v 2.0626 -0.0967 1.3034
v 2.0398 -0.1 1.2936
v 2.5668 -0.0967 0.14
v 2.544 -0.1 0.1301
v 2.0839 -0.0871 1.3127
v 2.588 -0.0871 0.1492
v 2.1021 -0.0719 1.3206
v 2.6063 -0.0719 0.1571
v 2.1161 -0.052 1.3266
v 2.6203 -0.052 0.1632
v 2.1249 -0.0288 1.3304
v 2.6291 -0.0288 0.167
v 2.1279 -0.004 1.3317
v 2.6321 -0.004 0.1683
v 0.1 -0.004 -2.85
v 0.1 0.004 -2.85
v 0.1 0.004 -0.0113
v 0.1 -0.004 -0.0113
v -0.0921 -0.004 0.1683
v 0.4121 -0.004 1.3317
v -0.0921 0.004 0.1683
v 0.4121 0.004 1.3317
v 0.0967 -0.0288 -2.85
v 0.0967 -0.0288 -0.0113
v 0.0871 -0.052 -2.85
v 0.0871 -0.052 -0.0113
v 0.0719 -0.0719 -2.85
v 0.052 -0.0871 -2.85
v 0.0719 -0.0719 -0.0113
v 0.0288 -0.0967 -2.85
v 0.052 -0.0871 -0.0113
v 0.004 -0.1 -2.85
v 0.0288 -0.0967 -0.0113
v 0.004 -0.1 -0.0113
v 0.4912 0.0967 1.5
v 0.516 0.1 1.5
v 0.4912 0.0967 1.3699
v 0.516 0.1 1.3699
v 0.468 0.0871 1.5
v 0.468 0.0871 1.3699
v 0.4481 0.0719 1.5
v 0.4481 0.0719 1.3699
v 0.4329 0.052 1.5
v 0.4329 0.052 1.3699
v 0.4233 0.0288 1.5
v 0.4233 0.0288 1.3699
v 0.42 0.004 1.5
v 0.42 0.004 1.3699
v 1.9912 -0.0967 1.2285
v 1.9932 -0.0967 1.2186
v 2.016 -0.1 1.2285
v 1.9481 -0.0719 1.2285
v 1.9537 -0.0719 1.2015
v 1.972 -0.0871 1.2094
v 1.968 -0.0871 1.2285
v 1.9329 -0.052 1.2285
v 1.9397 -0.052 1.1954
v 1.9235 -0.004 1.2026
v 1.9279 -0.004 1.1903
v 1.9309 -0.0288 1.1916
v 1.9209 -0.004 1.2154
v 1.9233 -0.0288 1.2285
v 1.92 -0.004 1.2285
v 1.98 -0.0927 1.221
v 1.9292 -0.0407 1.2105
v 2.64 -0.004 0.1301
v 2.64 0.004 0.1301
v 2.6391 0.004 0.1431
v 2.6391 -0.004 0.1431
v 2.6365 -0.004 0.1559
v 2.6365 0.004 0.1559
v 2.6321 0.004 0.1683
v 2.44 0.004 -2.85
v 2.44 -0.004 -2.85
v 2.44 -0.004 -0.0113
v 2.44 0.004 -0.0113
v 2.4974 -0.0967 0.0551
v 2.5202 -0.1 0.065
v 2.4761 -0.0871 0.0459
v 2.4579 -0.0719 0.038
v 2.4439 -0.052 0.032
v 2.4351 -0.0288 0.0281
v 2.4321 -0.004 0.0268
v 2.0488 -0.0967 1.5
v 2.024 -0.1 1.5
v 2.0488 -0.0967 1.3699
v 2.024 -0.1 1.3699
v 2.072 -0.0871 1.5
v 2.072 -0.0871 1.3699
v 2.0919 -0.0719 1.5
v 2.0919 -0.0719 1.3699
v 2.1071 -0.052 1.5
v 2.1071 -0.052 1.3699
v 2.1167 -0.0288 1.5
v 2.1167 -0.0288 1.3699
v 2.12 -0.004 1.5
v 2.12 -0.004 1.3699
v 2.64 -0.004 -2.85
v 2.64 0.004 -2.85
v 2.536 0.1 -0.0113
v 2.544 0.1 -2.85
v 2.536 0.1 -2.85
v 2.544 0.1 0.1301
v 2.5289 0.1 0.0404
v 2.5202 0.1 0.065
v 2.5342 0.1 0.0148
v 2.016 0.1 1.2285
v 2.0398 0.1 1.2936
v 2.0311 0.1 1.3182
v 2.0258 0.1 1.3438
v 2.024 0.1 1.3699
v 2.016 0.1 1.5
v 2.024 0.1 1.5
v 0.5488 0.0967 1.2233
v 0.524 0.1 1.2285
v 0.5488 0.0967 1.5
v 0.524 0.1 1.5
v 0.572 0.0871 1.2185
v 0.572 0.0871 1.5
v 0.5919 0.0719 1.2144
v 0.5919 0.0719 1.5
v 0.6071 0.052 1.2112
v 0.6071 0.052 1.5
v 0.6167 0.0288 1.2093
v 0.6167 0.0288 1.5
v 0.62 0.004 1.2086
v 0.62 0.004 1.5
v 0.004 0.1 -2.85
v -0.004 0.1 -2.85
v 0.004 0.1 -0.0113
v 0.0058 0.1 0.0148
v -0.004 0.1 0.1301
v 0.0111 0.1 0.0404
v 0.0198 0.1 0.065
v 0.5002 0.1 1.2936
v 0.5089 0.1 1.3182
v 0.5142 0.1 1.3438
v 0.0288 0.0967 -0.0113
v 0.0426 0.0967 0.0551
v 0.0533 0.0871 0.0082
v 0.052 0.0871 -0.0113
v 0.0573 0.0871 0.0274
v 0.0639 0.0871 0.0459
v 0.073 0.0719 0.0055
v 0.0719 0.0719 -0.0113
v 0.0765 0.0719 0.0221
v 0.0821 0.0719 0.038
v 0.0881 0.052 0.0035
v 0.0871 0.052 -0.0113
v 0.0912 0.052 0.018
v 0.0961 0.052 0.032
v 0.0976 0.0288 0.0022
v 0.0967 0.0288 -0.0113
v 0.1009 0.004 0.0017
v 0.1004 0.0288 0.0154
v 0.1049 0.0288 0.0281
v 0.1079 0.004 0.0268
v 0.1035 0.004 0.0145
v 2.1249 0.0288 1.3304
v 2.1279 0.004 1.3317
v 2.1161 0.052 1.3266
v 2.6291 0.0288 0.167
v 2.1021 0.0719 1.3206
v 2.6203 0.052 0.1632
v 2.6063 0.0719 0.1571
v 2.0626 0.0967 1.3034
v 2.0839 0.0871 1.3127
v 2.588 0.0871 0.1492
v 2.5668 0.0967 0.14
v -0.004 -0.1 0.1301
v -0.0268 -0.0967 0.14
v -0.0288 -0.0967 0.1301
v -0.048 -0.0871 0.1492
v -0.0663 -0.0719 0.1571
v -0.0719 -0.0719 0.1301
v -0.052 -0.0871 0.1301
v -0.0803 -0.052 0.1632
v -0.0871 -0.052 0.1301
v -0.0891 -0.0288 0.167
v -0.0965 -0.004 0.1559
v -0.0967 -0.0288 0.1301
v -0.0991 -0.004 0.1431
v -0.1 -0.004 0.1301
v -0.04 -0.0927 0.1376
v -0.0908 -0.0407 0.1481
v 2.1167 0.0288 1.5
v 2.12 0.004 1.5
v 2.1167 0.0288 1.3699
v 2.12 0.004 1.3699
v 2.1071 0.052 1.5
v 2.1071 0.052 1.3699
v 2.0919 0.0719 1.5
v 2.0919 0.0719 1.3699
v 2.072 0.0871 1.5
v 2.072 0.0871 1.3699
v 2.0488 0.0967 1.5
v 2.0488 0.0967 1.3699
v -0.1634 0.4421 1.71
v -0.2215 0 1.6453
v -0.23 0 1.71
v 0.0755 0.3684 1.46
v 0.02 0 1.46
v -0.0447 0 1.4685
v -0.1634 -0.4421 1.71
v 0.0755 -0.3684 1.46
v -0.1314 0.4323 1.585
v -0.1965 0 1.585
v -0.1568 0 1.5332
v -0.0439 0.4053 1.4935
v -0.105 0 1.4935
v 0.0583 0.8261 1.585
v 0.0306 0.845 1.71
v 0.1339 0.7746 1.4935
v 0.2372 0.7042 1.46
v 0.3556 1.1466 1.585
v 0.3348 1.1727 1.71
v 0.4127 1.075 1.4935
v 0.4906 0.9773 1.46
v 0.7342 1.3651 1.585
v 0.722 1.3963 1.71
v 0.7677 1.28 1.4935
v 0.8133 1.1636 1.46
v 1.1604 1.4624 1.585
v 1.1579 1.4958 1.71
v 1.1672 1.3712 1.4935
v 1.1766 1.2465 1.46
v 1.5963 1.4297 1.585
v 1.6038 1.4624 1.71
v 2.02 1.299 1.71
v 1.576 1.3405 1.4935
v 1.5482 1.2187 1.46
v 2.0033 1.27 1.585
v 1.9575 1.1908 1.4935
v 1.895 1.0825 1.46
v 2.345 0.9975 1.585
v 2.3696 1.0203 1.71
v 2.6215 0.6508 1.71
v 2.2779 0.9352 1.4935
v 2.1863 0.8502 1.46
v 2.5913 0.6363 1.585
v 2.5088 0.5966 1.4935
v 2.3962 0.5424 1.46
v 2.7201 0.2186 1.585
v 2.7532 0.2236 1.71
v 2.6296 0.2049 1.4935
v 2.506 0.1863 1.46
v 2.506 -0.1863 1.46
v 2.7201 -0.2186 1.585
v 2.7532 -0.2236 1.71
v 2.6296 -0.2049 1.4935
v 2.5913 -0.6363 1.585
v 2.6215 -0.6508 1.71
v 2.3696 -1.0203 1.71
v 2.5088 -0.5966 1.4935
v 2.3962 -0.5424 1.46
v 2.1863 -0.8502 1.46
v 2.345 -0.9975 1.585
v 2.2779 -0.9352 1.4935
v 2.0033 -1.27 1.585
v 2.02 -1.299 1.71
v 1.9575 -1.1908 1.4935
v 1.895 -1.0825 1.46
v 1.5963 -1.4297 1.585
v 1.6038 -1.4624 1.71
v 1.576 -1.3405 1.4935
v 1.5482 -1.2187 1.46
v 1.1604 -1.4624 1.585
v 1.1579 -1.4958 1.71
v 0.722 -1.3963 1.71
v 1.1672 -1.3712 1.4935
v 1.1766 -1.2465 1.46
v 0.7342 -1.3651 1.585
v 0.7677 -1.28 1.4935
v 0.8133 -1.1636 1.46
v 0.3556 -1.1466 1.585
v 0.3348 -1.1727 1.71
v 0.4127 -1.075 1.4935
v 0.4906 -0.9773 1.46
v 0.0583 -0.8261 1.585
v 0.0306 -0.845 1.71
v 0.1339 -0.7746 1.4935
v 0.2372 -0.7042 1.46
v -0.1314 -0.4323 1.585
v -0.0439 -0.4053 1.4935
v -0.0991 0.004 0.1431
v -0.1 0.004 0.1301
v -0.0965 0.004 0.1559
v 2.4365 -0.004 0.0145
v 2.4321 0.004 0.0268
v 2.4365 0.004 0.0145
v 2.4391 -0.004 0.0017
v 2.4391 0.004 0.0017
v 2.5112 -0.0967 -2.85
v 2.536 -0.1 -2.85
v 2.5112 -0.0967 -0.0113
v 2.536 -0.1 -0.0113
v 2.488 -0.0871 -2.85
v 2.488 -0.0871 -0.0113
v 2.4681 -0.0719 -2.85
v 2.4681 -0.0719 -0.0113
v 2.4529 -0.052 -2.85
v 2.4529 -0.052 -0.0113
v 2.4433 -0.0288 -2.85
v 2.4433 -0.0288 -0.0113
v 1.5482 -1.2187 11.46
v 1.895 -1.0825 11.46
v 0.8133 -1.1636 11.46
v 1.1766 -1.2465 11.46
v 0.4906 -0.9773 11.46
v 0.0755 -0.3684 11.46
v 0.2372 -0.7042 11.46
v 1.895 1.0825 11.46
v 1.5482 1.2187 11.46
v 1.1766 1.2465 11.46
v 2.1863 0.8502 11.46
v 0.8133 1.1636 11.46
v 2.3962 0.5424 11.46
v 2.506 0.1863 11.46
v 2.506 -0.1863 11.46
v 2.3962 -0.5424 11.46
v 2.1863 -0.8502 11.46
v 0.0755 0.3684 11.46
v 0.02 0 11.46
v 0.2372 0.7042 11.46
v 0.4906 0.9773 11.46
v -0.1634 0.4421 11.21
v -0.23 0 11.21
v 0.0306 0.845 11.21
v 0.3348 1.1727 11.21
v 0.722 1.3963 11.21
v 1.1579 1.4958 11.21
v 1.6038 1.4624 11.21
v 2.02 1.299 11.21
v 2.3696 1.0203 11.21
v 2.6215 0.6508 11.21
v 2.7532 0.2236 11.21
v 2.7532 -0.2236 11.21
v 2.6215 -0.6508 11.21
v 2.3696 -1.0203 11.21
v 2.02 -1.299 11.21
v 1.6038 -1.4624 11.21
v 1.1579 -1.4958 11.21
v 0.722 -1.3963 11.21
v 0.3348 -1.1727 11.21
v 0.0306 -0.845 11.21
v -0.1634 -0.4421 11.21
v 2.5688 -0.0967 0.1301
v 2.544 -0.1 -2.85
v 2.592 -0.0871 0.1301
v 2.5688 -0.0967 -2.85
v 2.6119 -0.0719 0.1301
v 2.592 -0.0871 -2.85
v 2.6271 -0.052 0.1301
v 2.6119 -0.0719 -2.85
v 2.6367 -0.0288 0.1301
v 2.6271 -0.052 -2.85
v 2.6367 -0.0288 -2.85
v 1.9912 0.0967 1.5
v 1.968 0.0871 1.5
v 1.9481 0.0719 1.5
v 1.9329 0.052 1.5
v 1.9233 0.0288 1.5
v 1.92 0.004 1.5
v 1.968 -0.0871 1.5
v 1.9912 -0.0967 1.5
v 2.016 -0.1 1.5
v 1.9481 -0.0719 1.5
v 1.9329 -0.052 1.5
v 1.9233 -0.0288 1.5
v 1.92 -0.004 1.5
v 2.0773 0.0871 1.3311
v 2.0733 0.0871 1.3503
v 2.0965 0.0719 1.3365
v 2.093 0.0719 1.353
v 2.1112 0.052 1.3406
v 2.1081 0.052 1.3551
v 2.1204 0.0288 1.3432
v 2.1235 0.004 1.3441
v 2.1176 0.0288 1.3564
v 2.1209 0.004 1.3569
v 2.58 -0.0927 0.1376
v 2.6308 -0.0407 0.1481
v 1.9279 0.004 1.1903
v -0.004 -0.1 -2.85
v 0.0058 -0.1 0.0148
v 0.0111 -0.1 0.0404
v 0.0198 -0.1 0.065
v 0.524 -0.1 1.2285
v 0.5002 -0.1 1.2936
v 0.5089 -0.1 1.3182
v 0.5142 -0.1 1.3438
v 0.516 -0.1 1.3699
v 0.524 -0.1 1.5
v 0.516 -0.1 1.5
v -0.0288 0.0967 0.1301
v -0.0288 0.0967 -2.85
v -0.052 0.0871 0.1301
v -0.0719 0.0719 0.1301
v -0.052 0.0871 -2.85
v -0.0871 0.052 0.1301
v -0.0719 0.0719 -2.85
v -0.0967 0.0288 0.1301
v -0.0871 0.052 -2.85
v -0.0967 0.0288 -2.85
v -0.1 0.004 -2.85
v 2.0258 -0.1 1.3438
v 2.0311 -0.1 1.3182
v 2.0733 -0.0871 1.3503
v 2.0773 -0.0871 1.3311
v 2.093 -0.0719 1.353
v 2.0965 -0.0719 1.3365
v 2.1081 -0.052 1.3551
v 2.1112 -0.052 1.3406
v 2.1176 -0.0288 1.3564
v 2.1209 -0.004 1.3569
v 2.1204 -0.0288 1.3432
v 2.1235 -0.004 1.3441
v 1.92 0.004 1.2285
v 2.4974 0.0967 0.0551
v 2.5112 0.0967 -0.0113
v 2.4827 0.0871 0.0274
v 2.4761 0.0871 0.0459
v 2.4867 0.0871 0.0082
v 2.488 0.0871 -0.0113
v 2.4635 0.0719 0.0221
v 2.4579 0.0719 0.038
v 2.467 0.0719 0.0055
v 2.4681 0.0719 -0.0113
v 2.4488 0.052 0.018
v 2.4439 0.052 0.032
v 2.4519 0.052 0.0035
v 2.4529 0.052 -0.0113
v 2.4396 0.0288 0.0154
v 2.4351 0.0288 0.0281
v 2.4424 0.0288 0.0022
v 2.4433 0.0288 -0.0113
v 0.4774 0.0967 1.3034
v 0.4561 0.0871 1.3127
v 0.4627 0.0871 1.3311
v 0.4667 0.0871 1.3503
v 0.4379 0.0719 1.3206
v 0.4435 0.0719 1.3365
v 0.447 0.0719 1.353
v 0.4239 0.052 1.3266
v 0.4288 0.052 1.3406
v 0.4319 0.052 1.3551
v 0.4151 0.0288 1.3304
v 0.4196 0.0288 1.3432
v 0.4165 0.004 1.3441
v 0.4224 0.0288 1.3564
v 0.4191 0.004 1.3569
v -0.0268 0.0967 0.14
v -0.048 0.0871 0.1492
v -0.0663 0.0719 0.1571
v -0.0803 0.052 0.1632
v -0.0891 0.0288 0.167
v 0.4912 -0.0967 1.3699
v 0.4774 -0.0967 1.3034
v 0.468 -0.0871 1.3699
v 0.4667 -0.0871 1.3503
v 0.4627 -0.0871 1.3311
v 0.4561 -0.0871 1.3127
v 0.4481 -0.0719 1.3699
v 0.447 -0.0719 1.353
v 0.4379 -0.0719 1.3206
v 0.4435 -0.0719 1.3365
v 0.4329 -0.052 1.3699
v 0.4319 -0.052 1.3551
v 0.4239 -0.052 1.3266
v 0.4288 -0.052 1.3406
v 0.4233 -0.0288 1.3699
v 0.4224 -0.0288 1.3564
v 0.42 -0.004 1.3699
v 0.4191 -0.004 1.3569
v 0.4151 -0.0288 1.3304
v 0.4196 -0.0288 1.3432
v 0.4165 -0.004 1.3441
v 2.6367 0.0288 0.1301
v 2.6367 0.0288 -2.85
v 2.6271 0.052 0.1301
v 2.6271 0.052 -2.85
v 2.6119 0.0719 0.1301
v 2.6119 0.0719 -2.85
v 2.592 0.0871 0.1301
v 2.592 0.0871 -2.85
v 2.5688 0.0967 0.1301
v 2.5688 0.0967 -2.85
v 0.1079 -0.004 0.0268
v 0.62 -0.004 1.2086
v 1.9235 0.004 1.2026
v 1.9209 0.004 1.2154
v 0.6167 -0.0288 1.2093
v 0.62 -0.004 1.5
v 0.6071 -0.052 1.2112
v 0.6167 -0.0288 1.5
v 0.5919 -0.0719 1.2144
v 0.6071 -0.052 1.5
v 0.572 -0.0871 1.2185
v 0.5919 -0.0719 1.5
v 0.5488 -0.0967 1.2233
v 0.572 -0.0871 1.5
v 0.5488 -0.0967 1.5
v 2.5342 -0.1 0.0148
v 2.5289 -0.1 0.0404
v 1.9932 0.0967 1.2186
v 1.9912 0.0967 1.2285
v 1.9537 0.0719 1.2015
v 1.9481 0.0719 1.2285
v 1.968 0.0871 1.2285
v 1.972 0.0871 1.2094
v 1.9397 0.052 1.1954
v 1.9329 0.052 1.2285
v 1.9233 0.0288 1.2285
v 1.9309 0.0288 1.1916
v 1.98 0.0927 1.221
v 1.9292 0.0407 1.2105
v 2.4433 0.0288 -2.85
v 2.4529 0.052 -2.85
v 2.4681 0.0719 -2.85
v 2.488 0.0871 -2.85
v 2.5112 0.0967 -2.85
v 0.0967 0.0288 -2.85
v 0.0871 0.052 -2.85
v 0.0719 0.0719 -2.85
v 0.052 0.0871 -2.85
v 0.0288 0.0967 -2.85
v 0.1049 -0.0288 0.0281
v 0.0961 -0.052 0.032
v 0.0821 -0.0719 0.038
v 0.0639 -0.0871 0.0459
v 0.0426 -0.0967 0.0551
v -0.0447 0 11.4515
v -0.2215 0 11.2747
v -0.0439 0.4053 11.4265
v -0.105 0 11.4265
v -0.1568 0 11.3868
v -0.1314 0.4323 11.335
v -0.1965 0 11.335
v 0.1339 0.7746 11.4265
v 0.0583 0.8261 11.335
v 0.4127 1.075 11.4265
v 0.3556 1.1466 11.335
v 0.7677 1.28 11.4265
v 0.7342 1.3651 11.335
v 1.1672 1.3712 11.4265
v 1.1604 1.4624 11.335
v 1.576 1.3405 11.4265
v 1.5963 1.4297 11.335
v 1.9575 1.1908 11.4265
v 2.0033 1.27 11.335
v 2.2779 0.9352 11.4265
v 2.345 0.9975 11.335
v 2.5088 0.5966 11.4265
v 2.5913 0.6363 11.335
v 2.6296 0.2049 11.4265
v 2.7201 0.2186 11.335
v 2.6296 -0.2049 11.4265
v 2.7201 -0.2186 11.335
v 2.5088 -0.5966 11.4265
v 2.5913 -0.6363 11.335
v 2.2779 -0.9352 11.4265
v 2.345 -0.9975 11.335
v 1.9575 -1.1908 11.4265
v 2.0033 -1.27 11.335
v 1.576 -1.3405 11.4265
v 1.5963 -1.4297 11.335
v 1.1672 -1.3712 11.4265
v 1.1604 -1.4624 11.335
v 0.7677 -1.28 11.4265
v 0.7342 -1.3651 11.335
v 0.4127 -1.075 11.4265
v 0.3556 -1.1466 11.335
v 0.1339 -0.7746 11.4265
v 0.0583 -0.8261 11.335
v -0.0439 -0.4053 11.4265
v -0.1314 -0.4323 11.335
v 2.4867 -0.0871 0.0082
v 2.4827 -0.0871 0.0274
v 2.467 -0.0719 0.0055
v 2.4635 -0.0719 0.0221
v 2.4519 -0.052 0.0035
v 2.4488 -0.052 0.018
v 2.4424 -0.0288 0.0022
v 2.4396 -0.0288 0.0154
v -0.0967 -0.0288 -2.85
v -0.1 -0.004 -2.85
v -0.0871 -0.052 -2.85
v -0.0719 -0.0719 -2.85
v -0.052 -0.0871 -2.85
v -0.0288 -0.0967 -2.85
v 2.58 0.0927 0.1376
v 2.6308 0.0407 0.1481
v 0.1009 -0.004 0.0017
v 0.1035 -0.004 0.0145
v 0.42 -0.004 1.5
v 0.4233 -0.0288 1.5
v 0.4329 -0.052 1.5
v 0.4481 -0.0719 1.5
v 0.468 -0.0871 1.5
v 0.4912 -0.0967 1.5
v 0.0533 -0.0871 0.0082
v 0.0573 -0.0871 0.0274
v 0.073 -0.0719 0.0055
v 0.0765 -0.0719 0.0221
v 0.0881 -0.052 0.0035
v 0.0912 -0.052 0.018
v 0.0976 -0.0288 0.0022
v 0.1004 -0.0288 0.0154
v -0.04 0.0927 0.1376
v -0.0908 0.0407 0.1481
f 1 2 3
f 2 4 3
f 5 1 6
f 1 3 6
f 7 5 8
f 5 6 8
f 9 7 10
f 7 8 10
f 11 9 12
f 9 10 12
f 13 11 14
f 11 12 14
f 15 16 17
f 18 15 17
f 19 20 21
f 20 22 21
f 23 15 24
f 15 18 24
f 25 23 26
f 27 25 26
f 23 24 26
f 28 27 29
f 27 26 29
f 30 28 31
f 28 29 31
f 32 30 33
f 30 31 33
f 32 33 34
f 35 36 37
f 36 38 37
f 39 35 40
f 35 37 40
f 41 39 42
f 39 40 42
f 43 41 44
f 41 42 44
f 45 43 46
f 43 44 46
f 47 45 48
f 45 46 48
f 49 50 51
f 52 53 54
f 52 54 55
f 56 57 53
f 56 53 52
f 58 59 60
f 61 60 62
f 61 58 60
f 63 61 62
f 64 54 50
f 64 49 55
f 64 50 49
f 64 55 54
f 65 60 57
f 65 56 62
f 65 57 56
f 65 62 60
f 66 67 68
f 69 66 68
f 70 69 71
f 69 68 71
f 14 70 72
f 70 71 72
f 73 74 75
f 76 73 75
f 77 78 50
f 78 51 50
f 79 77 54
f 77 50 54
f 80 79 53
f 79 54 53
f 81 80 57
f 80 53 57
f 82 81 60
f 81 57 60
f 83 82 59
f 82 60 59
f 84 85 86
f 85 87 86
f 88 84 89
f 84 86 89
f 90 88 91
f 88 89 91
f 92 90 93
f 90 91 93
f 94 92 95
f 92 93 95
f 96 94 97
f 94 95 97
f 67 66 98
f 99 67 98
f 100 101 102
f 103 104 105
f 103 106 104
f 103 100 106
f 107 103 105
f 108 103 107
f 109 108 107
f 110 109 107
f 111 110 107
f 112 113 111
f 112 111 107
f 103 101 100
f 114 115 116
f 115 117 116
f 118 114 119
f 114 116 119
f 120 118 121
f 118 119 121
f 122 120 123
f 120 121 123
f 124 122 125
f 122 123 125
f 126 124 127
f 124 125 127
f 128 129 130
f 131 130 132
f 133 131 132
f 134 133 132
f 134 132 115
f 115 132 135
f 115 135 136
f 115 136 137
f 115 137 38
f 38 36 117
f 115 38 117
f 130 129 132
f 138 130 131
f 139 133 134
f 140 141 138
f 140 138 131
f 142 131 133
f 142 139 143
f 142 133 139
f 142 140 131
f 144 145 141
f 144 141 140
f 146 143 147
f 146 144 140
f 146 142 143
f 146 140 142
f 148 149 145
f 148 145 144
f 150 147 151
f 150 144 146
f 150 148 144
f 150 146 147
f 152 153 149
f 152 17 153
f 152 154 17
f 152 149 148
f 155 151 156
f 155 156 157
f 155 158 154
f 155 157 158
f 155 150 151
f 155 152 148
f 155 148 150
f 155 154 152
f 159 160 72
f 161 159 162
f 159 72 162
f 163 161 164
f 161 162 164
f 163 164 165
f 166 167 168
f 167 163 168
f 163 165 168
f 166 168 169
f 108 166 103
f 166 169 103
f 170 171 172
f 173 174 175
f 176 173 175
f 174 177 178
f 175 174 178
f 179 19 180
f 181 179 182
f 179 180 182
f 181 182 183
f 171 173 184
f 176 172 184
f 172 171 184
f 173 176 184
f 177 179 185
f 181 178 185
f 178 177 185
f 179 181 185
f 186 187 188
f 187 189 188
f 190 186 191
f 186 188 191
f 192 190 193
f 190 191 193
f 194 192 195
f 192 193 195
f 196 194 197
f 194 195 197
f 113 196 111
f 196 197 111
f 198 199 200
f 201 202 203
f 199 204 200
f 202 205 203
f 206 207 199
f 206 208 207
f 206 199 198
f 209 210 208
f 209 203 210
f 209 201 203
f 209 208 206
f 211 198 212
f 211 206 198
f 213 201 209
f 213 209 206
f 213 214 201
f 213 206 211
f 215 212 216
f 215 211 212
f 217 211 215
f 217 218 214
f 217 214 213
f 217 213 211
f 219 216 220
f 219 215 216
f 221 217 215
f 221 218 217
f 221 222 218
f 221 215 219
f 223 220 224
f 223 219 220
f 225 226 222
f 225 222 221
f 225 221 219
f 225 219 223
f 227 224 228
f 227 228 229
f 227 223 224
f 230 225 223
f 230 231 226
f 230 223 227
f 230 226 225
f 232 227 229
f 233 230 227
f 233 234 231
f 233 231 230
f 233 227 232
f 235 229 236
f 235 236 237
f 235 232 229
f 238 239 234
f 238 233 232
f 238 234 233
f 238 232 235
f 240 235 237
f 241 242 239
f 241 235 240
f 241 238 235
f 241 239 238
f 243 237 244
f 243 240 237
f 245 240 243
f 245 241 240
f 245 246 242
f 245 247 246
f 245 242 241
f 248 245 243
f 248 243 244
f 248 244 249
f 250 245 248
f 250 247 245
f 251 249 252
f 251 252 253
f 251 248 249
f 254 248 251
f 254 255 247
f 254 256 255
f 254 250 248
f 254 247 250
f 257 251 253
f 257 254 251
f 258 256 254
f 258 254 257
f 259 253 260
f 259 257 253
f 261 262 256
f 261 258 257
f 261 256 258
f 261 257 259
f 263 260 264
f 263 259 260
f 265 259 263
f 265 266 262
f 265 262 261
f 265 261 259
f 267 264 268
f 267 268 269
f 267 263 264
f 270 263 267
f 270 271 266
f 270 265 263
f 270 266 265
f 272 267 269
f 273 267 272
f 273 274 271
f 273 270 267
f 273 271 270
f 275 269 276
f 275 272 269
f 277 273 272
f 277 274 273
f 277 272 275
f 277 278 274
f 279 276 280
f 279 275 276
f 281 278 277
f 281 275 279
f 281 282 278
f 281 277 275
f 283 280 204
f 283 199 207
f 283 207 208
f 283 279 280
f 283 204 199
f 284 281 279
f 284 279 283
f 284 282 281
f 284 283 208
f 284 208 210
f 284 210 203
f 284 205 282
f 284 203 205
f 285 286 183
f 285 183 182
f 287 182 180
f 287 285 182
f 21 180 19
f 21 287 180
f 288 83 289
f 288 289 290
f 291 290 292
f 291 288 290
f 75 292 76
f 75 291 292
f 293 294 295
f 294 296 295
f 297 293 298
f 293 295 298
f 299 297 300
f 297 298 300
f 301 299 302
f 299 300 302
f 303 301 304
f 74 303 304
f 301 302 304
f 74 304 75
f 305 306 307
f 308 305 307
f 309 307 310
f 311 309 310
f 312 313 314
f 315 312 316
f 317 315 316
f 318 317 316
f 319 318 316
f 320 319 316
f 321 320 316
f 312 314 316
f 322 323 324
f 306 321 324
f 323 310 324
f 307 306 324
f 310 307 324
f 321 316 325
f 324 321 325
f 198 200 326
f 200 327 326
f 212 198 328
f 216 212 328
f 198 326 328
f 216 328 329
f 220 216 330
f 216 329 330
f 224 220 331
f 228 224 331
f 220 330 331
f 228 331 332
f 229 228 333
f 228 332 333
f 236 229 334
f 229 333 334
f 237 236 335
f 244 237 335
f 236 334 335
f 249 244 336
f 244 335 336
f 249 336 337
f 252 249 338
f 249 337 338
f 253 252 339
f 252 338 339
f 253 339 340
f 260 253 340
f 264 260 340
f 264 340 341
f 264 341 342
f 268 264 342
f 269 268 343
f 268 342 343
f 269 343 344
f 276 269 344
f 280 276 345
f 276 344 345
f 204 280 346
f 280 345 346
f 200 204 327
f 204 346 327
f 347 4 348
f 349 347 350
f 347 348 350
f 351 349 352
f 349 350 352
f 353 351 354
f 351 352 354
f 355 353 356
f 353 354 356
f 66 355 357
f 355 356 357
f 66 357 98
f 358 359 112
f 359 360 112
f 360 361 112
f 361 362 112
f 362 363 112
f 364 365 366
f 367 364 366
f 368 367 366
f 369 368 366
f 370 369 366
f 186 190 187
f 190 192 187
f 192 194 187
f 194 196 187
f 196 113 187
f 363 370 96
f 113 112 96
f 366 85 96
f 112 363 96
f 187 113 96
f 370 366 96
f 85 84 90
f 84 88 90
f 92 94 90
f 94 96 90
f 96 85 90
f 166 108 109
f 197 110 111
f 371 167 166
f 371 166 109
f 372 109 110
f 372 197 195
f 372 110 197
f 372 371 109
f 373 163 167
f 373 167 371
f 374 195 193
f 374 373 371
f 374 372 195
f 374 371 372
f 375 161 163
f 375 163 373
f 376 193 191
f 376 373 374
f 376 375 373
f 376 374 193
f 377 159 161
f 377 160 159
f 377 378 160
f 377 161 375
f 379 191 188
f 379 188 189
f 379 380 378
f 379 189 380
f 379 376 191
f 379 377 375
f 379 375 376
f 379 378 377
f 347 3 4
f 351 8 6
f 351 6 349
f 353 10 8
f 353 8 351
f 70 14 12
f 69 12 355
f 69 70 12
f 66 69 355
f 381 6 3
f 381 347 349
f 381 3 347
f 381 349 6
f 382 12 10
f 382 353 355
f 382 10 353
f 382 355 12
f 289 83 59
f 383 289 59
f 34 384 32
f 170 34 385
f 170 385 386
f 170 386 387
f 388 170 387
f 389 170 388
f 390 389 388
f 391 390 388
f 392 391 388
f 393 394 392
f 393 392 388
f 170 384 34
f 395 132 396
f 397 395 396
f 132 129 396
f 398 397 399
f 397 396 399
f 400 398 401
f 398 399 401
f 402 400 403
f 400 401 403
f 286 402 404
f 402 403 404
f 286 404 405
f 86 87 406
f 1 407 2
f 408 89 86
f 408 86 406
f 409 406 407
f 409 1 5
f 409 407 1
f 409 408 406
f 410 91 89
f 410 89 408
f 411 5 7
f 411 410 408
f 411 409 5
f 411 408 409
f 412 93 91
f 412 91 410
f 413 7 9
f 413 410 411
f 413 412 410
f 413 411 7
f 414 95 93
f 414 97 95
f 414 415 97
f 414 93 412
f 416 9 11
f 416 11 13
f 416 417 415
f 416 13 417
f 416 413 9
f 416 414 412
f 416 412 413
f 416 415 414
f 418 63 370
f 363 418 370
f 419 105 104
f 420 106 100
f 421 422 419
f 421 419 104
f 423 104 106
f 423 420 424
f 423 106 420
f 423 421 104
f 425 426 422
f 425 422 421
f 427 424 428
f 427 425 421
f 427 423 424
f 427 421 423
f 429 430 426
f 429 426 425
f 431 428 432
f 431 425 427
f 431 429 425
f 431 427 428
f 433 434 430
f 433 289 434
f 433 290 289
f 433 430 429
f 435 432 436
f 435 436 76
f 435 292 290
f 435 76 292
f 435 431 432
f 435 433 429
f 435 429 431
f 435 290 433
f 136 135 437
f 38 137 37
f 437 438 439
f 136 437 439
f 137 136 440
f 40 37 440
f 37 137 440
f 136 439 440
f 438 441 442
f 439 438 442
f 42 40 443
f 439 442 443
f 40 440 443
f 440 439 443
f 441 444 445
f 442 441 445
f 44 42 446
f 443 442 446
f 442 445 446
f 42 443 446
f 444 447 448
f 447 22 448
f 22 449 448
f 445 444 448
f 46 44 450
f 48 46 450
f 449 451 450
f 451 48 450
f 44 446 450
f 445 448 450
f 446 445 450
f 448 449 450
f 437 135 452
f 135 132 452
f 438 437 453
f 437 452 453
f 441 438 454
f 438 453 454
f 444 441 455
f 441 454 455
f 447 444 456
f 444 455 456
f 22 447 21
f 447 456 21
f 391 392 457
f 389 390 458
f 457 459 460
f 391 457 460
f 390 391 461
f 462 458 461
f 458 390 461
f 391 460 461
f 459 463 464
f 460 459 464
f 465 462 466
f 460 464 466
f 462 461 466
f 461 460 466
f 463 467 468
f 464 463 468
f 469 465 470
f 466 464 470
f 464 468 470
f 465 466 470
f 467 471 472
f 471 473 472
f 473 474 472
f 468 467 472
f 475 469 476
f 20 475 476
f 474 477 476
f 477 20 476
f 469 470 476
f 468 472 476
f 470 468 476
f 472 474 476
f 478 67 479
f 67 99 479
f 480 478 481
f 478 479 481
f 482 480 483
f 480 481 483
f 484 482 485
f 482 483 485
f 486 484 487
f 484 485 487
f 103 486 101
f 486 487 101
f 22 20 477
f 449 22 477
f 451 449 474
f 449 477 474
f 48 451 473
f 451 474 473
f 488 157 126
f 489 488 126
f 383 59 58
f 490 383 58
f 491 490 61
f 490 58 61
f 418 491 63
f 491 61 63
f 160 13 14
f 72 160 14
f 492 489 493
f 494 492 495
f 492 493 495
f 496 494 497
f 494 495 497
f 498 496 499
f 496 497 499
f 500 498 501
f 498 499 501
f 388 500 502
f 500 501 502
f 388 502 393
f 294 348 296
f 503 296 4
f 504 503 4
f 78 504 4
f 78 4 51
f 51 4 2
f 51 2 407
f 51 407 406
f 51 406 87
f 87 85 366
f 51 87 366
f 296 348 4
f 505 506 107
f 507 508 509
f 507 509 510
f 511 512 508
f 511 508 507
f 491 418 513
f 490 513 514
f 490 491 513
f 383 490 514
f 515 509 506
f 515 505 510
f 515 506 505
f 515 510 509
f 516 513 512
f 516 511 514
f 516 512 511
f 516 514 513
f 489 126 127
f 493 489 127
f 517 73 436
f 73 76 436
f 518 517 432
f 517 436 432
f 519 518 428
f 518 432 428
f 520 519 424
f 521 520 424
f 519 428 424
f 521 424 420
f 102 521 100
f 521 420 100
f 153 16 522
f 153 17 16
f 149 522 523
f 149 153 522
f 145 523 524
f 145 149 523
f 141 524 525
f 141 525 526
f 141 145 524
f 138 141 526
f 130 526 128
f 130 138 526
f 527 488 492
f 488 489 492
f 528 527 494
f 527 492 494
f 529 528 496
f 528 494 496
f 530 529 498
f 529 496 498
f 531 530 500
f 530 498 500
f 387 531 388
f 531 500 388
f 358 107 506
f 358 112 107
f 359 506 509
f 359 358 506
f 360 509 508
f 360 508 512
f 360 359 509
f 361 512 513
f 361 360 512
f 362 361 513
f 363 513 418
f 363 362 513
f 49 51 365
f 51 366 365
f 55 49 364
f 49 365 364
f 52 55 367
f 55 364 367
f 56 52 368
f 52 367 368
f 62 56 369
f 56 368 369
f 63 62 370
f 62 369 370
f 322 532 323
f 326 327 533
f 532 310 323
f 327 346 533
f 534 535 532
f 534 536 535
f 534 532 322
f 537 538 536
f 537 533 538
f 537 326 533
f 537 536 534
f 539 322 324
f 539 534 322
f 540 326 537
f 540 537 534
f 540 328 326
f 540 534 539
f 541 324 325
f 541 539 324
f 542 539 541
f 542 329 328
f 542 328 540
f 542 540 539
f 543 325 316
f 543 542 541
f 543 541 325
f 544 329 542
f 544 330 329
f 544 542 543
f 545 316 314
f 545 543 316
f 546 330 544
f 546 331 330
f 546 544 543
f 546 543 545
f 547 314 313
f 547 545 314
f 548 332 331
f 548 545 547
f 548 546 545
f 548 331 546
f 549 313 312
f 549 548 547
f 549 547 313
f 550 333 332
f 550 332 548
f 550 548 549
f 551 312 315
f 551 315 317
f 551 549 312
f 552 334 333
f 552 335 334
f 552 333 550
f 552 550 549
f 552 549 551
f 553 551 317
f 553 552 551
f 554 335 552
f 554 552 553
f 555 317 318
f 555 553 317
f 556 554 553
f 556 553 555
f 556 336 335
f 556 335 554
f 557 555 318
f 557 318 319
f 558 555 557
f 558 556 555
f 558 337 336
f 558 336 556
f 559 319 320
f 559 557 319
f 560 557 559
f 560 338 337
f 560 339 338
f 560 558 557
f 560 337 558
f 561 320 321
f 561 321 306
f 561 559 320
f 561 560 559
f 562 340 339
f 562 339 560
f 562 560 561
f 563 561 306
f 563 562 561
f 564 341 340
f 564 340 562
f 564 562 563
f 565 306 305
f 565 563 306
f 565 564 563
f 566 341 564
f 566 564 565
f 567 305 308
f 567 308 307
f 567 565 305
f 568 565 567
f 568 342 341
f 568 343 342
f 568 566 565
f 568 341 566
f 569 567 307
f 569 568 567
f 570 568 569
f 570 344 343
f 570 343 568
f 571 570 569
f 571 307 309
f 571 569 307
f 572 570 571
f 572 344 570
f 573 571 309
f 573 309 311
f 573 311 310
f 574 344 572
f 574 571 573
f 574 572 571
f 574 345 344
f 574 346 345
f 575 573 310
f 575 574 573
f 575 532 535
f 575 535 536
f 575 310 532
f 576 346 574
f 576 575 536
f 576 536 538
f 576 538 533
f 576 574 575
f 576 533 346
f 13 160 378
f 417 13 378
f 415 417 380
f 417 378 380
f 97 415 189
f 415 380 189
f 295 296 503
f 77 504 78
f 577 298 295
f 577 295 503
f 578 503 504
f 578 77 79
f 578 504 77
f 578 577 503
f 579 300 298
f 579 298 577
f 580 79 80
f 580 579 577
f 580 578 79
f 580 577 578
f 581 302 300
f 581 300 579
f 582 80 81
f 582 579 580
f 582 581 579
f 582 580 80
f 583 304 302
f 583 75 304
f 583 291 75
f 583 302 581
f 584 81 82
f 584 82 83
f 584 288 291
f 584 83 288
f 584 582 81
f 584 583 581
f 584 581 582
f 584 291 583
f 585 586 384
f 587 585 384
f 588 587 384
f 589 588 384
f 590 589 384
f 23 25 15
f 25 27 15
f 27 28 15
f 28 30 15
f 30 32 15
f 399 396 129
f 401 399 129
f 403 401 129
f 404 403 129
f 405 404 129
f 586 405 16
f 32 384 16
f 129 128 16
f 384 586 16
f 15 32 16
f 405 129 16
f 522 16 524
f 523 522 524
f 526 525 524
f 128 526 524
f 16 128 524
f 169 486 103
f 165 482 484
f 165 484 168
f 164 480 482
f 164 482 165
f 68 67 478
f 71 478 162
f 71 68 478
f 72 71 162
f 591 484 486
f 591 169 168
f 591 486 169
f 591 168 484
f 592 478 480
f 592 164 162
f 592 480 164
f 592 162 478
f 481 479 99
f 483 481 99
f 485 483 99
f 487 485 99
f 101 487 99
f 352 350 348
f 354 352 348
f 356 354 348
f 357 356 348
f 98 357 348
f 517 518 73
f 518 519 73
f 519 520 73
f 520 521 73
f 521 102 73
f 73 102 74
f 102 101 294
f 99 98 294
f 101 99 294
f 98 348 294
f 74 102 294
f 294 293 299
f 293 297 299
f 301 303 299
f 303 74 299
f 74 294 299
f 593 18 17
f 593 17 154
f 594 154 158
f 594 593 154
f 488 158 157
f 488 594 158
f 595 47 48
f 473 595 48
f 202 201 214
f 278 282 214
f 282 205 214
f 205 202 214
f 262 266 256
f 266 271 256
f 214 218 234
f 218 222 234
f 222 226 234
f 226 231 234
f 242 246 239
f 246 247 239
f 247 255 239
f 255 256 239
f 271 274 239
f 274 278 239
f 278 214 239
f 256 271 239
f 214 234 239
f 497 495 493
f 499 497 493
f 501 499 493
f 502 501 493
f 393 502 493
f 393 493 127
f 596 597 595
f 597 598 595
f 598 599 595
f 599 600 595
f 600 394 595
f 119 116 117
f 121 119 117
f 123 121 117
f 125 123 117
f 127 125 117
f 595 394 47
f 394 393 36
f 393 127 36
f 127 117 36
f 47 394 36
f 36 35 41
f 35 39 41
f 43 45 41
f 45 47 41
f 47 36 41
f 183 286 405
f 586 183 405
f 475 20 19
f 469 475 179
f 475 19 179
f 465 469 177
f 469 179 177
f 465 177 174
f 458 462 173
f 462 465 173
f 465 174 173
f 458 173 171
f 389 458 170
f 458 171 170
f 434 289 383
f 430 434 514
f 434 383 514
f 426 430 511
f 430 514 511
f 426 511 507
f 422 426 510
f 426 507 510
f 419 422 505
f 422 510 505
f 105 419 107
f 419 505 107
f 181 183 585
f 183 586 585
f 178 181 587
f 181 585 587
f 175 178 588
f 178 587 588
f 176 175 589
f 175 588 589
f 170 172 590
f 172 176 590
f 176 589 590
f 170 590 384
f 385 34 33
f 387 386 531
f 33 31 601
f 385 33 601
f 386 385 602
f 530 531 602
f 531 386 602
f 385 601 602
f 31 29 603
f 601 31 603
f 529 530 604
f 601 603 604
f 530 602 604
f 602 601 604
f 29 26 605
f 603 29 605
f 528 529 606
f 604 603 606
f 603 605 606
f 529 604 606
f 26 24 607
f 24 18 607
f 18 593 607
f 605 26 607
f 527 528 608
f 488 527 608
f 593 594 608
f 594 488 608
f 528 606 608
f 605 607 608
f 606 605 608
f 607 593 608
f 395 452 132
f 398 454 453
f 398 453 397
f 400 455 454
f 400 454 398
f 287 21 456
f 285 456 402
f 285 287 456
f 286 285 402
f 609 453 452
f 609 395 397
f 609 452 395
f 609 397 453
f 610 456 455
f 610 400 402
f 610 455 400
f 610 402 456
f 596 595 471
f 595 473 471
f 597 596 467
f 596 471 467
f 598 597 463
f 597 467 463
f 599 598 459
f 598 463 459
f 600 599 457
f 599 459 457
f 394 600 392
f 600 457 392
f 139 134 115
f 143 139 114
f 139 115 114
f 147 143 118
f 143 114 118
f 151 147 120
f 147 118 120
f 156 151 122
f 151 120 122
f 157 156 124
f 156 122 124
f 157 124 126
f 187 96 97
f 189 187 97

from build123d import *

# Parameters (mm, degrees)
PAD_DEPTH = 0.1
FILLET_R  = 0.096


with BuildPart() as revolution:
    # Sketch002 → Revolution (revolve)
    with BuildSketch(Plane.XZ):
        with BuildLine():
            Line((0.02, 11.46), (1.27, 11.46))
            Line((1.27, 1.46), (1.27, 11.46))
            Line((1.27, 1.46), (0.02, 1.46))
            ThreePointArc((-0.23, 1.71), (-0.156777, 1.533223), (0.02, 1.46))
            Line((-0.23, 1.71), (-0.23, 11.21))
            ThreePointArc((0.02, 11.46), (-0.156777, 11.386777), (-0.23, 11.21))
        make_face()
    revolve(axis=Axis((1.27, 0, 11.46), (0, 0, -1)))


with BuildPart() as fillet_body:
    # Sketch → Pad (new body, symmetric)
    with BuildSketch(Plane.XZ):
        Polygon((0.1, -2.85), (0.1, 0.008579), (0.62, 1.208579), (0.62, 1.5), (0.42, 1.5), (0.42, 1.35), (-0.1, 0.15), (-0.1, -2.85), align=None)
        Polygon((1.92, 1.5), (2.12, 1.5), (2.12, 1.35), (2.64, 0.15), (2.64, -2.85), (2.44, -2.85), (2.44, 0.008579), (1.92, 1.208579), align=None)
    extrude(amount=PAD_DEPTH, both=True)

    # Fillet
    fillet_edges = [fillet_body.edges().sort_by_distance(p)[0] for p in [
        (0.1, -0.1, -1.420711),
        (0.1, 0.1, -1.420711),
        (0.36, -0.1, 0.608579),
        (0.36, 0.1, 0.608579),
        (0.62, -0.1, 1.354289),
        (0.62, 0.1, 1.354289),
        (0.42, -0.1, 1.425),
        (0.16, -0.1, 0.75),
        (-0.1, -0.1, -1.35),
        (2.44, -0.1, -1.420711),
        (2.18, -0.1, 0.608579),
        (1.92, -0.1, 1.354289),
        (2.12, -0.1, 1.425),
        (2.38, -0.1, 0.75),
        (2.64, -0.1, -1.35),
        (2.64, 0.1, -1.35),
        (2.38, 0.1, 0.75),
        (2.12, 0.1, 1.425),
        (2.64, 0, 0.15),
        (2.12, 0, 1.35),
        (1.92, 0.1, 1.354289),
        (2.18, 0.1, 0.608579),
        (2.44, 0.1, -1.420711),
        (0.16, 0.1, 0.75),
        (0.42, 0.1, 1.425),
        (-0.1, 0.1, -1.35),
        (0.1, 0, 0.008579),
        (-0.1, 0, 0.15),
        (0.42, 0, 1.35),
        (1.92, 0, 1.208579),
        (2.44, 0, 0.008579),
    ]]
    fillet(fillet_edges, radius=FILLET_R)


solid = Compound([revolution.part, fillet_body.part])
